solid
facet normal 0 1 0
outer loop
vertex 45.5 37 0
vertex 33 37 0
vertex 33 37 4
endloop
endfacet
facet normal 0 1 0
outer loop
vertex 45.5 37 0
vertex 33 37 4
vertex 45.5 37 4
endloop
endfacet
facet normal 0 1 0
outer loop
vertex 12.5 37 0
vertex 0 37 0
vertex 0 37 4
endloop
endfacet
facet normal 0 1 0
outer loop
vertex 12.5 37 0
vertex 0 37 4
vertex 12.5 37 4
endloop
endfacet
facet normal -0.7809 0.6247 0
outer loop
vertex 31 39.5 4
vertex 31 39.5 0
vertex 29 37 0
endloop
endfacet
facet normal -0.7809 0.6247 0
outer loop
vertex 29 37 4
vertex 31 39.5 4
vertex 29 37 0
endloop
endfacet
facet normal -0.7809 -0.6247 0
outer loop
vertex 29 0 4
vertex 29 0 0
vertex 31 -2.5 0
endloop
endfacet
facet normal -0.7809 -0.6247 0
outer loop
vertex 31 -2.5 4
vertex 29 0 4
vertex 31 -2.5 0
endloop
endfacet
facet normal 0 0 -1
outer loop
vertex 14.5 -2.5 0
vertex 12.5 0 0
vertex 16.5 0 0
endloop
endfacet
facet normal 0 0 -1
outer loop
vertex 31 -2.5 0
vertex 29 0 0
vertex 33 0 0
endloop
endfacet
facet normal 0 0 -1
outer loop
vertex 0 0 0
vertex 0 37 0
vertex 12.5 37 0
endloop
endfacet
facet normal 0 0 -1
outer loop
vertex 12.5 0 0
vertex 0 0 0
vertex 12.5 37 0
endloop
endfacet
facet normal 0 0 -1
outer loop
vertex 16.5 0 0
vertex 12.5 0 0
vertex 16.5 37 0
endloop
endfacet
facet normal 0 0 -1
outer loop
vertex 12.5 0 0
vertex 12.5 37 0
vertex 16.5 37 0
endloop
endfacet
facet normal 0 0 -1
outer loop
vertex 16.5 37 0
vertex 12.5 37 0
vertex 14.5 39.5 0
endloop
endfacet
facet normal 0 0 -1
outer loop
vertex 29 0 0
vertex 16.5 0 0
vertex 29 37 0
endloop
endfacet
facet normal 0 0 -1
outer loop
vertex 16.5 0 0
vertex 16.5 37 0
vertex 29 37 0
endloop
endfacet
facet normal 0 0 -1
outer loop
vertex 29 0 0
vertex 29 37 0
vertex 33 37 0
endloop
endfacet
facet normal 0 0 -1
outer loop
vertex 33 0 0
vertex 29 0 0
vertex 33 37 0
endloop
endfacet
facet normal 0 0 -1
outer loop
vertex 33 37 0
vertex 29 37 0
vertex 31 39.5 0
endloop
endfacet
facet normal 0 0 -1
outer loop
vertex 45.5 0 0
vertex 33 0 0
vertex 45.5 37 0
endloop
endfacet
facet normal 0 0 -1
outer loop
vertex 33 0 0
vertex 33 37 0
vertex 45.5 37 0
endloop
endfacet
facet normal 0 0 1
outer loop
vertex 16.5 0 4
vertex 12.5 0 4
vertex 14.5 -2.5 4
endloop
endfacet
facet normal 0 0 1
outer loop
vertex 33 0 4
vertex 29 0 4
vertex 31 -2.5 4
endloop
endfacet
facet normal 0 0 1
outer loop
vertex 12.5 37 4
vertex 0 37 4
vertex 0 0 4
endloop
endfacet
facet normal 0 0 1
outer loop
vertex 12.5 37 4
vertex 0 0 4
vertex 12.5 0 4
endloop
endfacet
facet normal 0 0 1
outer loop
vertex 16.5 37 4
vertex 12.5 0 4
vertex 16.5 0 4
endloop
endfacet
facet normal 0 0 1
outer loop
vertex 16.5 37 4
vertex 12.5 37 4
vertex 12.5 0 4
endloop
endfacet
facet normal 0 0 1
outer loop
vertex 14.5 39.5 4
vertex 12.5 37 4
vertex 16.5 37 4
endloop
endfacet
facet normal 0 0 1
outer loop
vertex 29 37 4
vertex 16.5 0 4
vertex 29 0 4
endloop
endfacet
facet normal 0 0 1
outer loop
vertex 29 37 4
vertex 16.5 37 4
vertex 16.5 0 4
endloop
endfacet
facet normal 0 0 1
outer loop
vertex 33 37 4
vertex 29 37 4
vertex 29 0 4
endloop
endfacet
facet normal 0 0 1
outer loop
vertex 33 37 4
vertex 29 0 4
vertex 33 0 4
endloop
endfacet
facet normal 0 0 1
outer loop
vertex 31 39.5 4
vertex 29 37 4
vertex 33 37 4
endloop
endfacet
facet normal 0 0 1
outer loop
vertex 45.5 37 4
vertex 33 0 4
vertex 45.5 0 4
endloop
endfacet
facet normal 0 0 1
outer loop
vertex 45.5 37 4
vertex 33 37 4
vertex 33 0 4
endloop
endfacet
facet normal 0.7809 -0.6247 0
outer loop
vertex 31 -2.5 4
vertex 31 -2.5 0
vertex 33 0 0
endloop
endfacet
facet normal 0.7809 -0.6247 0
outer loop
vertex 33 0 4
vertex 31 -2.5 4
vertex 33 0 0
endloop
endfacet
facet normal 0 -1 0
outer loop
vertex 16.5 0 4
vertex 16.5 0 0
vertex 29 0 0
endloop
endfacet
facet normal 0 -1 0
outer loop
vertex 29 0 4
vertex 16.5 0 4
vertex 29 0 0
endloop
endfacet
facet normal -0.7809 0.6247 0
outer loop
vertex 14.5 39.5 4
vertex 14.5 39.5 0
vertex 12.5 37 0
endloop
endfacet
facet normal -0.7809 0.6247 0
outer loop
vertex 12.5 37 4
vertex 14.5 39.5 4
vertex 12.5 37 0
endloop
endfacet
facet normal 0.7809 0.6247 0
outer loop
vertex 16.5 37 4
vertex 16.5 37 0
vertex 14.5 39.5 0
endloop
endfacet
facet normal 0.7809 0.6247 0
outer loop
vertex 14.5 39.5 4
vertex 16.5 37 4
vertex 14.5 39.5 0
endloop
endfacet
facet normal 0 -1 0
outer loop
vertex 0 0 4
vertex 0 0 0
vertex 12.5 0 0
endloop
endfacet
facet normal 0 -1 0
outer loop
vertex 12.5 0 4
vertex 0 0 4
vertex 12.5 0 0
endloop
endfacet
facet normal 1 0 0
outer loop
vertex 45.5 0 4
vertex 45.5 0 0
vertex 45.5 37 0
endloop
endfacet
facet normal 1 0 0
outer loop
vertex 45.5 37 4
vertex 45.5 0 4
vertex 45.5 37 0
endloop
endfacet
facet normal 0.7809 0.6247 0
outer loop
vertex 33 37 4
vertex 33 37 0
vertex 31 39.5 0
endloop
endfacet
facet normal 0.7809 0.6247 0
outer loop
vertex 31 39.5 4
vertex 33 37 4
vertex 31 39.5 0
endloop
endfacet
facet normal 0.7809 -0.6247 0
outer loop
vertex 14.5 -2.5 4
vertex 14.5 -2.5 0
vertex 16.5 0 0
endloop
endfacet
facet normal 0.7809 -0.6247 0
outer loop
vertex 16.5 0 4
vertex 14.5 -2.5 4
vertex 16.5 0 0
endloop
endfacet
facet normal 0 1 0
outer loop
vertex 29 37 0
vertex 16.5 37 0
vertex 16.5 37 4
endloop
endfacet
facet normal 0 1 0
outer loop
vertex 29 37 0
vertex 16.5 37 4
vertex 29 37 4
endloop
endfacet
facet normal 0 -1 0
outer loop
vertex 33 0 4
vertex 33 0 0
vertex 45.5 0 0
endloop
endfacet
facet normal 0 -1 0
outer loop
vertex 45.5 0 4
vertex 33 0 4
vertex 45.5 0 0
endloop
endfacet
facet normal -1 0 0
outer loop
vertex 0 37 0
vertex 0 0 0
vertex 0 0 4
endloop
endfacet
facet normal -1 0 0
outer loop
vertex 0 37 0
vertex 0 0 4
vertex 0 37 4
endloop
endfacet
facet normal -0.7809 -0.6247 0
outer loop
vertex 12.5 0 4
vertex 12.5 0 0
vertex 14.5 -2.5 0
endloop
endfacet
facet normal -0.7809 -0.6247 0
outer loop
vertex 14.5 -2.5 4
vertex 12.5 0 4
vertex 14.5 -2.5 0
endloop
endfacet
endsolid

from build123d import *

# Parameters (mm, degrees)
SKETCH1_W   = 45.5
SKETCH1_H   = 37
BASIS_DEPTH = 4


with BuildPart() as part:
    # Sketch1 → Basis (new body)
    with BuildSketch(Plane.XY):
        with Locations((22.75, 18.5)):
            Rectangle(SKETCH1_W, SKETCH1_H)
        Polygon((14.5, 39.5), (12.5, 37), (16.5, 37), align=None)
        Polygon((31, 39.5), (29, 37), (33, 37), align=None)
        Polygon((16.5, 0), (12.5, 0), (14.5, -2.5), align=None)
        Polygon((33, 0), (29, 0), (31, -2.5), align=None)
    extrude(amount=BASIS_DEPTH)


solid = part.part
